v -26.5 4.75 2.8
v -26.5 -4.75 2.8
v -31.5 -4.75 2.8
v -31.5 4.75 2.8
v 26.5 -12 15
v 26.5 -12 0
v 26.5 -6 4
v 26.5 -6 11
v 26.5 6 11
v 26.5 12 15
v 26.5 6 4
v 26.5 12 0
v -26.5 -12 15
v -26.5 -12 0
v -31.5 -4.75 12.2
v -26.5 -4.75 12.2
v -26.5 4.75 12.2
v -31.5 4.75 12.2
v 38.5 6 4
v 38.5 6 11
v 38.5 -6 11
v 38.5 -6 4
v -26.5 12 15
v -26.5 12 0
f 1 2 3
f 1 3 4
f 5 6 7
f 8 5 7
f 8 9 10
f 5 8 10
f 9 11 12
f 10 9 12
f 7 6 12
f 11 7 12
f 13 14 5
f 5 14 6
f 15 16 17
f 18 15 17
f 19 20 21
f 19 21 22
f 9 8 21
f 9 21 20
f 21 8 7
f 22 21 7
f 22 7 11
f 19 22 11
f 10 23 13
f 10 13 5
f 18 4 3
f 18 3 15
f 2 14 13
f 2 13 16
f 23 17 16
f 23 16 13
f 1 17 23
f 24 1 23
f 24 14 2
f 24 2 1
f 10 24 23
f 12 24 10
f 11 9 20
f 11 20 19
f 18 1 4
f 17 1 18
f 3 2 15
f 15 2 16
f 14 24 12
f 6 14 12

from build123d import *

# Parameters (mm, degrees)
SKETCH_1_W      = 53
SKETCH_1_H      = 24
EXTRUDE_1_DEPTH = 15
SKETCH_2_W      = 7
SKETCH_2_H      = 12
EXTRUDE_2_DEPTH = 12
SKETCH_3_W      = 9.4
SKETCH_3_H      = 9.5
EXTRUDE_3_DEPTH = 5


with BuildPart() as part:
    # 草图1 → 凸台-拉伸1 (new body)
    with BuildSketch(Plane.XY):
        Rectangle(SKETCH_1_W, SKETCH_1_H)
    extrude(amount=EXTRUDE_1_DEPTH)

    # 草图2 → 凸台-拉伸2 (add)
    with BuildSketch(Plane(origin=(26.5, 0, 0), x_dir=(0, 0, -1), z_dir=(1, 0, 0))):
        with Locations((-7.5, 0)):
            Rectangle(SKETCH_2_W, SKETCH_2_H)
    extrude(amount=EXTRUDE_2_DEPTH)

    # 草图3 → 凸台-拉伸3 (add)
    with BuildSketch(Plane.ZY.offset(26.5)):
        with Locations((7.5, 0)):
            Rectangle(SKETCH_3_W, SKETCH_3_H)
    extrude(amount=EXTRUDE_3_DEPTH)


solid = part.part
